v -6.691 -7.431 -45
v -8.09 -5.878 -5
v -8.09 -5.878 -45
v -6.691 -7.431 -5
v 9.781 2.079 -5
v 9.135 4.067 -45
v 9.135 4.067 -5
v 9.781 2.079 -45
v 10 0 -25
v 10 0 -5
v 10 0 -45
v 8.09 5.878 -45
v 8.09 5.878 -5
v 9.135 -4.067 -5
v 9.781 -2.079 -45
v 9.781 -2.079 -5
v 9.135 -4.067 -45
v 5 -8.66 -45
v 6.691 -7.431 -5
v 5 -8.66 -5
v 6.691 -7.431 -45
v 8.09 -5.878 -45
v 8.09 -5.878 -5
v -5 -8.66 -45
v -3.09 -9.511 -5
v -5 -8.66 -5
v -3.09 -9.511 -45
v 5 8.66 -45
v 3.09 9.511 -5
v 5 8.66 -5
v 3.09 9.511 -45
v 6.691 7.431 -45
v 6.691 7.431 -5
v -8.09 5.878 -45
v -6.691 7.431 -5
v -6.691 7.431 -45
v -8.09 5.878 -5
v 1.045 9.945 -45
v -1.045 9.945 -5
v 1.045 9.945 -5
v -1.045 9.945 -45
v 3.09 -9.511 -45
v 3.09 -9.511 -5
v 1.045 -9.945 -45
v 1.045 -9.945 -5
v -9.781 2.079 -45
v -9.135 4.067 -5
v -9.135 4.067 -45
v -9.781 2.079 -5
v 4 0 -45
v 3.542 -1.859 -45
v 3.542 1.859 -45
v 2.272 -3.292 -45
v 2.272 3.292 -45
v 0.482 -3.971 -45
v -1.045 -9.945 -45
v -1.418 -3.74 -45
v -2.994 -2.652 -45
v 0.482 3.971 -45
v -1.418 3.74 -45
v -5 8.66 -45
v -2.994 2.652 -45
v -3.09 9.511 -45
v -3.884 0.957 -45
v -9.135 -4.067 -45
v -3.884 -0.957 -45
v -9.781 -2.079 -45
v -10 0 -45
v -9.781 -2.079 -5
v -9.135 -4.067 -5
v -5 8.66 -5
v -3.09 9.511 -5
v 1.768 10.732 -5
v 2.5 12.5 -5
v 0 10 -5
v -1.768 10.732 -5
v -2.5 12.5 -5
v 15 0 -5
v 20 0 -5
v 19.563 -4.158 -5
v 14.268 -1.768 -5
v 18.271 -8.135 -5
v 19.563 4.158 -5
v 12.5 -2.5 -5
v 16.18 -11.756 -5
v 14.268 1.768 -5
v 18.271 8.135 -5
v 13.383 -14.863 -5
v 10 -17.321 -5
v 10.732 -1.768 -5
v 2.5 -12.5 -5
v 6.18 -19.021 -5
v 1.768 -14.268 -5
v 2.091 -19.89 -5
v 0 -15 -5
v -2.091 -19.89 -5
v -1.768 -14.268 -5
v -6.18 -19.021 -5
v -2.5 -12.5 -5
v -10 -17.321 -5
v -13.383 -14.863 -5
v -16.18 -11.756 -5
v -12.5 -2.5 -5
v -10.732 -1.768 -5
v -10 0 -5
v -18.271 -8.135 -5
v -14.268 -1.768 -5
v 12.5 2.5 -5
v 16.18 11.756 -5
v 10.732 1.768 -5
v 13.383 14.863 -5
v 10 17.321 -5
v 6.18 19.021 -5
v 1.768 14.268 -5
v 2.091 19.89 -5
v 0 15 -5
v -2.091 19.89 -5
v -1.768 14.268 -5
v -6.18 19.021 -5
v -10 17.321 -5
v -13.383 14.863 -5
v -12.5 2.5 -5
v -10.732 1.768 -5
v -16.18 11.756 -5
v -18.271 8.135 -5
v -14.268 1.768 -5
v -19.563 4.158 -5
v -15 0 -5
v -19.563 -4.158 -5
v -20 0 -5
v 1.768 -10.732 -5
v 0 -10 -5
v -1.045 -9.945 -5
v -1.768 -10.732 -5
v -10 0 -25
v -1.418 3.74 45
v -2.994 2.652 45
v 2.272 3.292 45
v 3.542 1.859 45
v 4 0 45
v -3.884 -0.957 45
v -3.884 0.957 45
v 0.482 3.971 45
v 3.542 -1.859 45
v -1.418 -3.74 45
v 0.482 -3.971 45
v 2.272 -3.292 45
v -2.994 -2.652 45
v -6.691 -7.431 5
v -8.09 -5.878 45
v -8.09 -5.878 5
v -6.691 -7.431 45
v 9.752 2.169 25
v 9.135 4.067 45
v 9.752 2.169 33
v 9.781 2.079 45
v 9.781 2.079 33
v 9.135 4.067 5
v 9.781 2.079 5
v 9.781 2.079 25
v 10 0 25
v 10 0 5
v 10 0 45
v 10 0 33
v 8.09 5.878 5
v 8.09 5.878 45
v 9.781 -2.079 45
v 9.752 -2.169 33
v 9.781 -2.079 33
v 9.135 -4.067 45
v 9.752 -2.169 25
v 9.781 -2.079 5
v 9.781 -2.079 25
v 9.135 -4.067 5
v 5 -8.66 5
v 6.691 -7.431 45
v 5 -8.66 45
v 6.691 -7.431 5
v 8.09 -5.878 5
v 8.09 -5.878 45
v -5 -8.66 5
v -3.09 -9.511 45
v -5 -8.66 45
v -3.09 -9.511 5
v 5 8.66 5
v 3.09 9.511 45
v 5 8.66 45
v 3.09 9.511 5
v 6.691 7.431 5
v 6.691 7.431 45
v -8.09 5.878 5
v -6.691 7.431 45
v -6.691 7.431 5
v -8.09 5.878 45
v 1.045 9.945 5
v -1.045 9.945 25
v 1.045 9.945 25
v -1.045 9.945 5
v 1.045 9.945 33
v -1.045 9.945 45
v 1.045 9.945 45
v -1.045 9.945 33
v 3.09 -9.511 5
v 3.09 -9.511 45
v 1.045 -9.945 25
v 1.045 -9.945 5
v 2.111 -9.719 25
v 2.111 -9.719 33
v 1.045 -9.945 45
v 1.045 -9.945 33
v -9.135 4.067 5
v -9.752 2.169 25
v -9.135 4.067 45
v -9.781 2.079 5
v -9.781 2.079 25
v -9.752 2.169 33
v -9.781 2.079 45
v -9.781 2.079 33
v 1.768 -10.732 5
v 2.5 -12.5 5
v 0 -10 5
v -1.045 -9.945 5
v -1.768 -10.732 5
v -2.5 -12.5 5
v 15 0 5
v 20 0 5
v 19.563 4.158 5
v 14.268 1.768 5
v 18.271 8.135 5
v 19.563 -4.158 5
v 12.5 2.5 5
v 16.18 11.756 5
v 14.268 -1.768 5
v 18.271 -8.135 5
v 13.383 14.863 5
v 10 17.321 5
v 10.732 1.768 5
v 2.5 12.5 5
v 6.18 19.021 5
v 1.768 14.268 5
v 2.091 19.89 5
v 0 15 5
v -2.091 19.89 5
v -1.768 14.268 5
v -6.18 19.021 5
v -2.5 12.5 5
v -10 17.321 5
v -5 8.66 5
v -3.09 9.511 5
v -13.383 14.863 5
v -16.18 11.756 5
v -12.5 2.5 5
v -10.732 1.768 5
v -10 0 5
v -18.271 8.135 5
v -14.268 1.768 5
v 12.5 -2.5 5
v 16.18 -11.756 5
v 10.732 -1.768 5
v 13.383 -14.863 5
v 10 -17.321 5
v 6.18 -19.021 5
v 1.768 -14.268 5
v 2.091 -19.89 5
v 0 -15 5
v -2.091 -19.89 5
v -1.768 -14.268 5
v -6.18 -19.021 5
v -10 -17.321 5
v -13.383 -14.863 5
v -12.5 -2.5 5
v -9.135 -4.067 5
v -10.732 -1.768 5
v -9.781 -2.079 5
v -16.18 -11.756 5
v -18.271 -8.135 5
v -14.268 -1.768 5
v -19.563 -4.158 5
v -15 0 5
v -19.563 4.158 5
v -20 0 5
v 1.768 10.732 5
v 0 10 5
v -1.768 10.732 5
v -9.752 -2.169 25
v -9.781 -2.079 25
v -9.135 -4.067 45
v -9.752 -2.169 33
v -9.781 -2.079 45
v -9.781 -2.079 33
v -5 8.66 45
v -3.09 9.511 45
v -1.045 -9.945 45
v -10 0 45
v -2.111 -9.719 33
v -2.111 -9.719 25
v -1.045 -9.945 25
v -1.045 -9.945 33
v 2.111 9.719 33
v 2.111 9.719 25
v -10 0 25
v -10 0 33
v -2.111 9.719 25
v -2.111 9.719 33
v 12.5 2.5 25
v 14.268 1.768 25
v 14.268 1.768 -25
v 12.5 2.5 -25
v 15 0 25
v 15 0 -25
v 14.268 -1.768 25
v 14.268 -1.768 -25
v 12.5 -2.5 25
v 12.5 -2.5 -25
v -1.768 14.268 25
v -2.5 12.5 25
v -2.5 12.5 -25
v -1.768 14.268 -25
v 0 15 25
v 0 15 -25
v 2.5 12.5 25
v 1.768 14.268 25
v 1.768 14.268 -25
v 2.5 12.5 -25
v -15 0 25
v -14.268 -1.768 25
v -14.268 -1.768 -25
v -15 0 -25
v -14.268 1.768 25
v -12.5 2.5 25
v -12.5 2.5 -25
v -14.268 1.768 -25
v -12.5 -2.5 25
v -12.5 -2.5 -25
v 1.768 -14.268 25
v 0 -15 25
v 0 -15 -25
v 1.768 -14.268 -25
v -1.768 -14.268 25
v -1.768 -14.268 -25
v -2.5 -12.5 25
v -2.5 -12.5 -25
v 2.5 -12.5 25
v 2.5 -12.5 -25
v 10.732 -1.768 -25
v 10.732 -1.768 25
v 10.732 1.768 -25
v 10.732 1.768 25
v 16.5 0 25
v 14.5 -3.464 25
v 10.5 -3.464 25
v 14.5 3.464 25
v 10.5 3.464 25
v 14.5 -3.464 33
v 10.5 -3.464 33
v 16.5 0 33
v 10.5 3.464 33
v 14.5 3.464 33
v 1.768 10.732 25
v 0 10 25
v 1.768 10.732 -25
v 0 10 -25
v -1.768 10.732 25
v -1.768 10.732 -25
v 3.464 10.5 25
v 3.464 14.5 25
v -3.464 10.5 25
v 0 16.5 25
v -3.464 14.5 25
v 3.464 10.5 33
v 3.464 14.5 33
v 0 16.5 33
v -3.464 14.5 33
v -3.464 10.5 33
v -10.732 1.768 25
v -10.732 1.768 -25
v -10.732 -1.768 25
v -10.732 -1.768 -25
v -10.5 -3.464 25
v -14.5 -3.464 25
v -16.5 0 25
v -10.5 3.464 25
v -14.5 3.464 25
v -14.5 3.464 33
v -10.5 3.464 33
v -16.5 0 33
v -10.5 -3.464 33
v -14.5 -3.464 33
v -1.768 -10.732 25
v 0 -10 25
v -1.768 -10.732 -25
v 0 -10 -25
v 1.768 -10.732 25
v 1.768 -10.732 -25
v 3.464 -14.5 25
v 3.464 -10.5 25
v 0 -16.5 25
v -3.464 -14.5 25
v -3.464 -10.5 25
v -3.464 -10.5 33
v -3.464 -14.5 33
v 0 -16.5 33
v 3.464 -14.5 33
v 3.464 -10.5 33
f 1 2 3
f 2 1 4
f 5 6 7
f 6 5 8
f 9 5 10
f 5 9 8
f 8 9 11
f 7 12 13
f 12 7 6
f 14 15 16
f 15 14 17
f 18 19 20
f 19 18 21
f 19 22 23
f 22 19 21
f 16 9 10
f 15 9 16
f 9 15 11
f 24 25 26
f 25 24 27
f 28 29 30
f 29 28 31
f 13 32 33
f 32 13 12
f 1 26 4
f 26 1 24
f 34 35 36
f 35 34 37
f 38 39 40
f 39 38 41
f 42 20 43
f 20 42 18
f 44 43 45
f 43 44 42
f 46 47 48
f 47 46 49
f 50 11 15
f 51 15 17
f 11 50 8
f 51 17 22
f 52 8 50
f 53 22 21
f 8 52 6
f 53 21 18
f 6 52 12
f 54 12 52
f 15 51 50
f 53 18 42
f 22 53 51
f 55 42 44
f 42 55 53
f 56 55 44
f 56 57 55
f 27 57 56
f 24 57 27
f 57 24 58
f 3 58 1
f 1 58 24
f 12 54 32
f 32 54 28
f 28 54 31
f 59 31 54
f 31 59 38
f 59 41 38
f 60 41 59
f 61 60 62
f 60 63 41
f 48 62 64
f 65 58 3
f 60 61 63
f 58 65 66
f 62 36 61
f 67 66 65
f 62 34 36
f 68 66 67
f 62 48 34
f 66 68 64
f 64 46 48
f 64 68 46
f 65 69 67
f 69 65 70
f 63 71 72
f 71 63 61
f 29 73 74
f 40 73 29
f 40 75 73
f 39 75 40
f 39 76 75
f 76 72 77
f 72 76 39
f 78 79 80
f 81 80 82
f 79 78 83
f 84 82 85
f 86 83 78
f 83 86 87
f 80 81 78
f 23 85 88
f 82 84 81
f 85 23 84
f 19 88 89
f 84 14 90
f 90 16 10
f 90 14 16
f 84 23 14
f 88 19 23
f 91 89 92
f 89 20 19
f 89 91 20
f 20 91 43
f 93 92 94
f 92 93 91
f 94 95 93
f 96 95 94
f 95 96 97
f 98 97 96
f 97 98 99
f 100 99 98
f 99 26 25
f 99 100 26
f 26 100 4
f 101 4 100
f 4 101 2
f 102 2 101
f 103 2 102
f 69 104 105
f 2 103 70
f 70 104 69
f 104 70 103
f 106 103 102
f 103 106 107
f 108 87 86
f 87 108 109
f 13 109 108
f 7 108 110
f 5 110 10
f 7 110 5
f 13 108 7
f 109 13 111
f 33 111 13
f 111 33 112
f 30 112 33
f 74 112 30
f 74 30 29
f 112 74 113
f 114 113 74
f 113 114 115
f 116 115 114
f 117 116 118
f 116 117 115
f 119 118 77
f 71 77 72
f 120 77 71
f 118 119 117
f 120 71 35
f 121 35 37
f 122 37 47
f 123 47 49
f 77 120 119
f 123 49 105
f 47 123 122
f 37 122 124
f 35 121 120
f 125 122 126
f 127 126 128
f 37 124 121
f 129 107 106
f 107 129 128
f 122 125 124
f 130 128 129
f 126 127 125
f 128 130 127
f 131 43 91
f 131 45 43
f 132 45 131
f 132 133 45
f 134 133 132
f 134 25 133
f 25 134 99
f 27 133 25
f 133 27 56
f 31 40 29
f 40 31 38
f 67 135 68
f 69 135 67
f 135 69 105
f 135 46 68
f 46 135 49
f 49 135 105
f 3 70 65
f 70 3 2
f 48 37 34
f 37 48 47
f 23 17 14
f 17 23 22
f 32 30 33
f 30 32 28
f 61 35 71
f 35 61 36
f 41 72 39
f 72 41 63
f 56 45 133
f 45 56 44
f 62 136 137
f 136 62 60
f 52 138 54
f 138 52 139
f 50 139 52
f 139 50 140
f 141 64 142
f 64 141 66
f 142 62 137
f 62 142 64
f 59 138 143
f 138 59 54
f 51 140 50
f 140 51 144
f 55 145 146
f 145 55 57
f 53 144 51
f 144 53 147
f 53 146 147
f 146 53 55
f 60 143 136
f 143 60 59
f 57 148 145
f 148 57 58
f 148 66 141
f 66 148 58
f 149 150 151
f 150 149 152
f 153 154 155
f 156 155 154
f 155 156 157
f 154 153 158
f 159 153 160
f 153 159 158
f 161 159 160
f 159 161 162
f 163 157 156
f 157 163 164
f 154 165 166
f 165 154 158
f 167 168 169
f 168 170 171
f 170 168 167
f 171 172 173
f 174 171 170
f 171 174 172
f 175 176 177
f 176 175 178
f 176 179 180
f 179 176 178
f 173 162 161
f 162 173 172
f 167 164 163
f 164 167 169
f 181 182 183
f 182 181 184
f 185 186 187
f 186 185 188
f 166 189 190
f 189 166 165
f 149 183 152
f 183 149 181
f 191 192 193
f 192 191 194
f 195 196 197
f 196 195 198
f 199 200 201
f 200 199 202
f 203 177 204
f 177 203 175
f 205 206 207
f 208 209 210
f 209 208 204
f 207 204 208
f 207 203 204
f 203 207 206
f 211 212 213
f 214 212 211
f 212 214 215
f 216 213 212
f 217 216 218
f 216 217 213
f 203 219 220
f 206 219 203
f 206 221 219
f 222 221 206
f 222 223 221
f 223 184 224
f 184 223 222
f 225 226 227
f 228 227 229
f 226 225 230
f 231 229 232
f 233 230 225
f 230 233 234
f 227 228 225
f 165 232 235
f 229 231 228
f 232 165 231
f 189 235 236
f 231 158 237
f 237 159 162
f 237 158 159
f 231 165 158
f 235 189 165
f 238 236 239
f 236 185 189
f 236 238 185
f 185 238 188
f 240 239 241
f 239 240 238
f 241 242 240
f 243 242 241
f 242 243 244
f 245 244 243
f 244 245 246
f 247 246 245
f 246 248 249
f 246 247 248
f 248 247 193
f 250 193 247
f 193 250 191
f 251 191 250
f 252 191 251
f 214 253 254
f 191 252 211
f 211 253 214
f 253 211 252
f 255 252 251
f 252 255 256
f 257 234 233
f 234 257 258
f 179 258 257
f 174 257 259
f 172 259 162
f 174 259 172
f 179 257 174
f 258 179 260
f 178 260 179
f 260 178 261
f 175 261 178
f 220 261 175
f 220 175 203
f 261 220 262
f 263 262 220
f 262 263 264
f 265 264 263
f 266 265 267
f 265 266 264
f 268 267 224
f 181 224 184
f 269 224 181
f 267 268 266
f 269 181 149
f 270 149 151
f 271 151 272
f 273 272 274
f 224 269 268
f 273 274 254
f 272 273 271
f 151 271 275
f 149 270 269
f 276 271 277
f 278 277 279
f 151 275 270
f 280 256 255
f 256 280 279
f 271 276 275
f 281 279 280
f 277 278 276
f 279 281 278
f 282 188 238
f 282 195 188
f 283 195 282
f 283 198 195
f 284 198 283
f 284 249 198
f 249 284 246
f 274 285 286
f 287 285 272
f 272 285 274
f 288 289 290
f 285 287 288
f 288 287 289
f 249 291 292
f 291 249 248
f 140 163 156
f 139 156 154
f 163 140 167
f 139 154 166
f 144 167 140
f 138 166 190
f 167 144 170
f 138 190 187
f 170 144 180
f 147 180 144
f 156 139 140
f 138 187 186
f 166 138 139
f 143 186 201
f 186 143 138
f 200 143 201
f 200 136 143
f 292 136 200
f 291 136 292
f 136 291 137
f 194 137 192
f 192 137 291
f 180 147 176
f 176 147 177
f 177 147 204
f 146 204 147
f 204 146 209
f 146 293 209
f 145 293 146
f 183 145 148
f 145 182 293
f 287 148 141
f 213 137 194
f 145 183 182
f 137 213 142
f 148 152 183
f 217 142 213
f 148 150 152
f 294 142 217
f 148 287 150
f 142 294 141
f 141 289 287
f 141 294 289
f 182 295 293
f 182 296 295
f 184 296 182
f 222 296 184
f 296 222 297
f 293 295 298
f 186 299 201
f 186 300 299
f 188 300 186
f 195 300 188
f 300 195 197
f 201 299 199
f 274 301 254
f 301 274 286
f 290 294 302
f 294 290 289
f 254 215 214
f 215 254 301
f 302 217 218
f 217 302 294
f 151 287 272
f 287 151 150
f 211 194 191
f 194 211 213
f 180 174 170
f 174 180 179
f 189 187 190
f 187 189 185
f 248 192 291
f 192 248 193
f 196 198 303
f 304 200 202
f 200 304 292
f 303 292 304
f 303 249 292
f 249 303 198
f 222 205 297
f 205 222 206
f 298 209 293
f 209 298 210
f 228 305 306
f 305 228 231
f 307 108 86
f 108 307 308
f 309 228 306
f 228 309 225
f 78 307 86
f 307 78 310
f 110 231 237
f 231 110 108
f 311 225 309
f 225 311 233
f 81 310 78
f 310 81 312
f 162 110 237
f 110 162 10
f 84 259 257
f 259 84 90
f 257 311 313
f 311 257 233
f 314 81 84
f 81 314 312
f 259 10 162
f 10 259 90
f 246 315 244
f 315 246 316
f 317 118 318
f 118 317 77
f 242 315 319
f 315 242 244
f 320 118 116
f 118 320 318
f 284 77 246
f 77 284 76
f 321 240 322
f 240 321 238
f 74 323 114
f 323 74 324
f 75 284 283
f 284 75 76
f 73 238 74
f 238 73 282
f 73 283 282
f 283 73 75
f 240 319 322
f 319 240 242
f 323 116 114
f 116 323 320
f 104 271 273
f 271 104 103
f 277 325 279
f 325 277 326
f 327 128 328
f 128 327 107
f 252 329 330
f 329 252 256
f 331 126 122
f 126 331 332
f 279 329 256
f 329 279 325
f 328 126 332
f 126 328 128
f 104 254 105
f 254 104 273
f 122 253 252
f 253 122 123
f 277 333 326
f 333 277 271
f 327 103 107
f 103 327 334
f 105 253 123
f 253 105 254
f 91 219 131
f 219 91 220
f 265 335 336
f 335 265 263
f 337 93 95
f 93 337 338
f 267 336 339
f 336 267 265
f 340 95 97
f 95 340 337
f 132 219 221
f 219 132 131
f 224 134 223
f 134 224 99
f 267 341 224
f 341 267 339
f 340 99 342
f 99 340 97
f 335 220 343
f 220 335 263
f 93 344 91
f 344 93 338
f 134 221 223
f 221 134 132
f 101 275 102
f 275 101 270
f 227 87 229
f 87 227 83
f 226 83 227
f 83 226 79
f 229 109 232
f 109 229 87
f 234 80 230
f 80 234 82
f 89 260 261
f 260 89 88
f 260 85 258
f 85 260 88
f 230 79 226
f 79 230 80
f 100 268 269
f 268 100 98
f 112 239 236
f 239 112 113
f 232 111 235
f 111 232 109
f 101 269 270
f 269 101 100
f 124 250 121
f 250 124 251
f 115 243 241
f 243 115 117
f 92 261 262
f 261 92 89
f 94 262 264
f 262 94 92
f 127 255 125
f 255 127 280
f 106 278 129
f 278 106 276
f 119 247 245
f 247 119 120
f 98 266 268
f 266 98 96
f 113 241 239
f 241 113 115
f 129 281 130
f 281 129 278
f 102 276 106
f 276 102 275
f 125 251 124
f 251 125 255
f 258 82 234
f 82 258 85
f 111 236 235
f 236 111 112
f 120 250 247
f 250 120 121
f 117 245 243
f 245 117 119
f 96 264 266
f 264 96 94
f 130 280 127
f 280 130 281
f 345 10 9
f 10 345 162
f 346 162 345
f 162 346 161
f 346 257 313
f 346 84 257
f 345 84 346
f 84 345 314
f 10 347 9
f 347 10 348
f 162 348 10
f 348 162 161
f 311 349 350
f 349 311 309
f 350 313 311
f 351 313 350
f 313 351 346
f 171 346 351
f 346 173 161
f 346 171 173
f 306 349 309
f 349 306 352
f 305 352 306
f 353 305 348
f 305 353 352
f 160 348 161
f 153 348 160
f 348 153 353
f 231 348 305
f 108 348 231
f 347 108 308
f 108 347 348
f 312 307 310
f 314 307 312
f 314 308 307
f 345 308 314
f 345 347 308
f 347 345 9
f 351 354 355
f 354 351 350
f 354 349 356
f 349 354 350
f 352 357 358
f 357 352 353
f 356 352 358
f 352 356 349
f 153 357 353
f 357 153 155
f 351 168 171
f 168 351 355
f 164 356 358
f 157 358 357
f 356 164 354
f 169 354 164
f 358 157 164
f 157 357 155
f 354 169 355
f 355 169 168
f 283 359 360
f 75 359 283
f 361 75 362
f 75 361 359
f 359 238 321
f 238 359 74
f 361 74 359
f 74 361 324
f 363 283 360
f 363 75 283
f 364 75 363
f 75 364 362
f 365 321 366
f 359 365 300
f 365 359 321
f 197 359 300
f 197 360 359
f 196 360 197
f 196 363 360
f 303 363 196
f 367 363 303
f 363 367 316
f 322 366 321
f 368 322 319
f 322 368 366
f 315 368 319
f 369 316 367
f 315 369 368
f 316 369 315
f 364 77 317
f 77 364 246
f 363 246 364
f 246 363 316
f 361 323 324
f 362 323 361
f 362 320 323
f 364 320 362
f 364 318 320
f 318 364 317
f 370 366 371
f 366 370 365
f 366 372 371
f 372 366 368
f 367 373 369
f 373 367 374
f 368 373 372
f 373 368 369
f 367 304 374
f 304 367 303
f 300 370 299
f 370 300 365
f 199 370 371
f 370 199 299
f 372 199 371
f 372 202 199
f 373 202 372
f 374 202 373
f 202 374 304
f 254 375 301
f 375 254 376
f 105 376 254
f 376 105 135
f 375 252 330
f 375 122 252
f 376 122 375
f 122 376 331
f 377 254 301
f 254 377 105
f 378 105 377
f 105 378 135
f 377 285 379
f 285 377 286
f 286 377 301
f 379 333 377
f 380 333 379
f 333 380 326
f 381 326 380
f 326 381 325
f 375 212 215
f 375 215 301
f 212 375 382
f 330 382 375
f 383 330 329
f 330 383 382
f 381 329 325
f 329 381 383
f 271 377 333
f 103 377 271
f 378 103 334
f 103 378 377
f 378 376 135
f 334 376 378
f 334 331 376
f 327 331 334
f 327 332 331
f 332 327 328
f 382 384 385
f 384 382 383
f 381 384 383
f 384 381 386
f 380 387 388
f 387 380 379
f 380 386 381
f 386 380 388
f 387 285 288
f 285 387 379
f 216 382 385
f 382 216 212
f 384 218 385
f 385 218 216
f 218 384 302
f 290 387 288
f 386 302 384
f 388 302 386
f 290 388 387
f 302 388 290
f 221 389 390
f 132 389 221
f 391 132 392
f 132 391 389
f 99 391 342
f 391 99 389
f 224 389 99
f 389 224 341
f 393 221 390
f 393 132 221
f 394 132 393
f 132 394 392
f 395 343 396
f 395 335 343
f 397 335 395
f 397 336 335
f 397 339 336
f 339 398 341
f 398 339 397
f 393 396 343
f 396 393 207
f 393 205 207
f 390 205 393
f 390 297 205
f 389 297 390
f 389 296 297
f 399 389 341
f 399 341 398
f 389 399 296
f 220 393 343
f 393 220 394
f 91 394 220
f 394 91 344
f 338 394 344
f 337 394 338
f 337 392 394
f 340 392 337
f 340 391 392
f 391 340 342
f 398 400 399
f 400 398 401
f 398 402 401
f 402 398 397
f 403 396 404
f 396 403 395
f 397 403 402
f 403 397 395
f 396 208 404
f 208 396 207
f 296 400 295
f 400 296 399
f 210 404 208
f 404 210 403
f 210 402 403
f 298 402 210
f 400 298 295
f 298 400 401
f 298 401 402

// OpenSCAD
//start

// Parameters
shaft_length = 40;
shaft_diameter = 20;
shaft_hole_diameter = 8;
flange_diameter = 40;
flange_thickness = 5;
diaphragm_thickness = 2;
bolt_diameter = 5;
bolt_length = 50;
nut_size = 8;
bolt_spacing = 25;

// Function to create a shaft
module shaft() {
    difference() {
        cylinder(h=shaft_length, d=shaft_diameter, center=true);
        cylinder(h=shaft_length+2, d=shaft_hole_diameter, center=true);
    }
}

// Function to create a flange plate
module flange_plate() {
    difference() {
        cylinder(h=flange_thickness, d=flange_diameter, center=true);
        cylinder(h=flange_thickness+2, d=shaft_hole_diameter, center=true);
        for (i = [0:3]) {
            rotate([0, 0, i * 90])
                translate([bolt_spacing/2, 0, 0])
                cylinder(h=flange_thickness+2, d=bolt_diameter, center=true);
        }
    }
}

// Function to create the diaphragm
module diaphragm() {
    difference() {
        cylinder(h=diaphragm_thickness, d=flange_diameter, center=true);
        cylinder(h=diaphragm_thickness+2, d=shaft_hole_diameter, center=true);
        for (i = [0:3]) {
            rotate([0, 0, i * 90])
                translate([bolt_spacing/2, 0, 0])
                cylinder(h=diaphragm_thickness+2, d=bolt_diameter, center=true);
        }
    }
}

// Function to create a bolt
module bolt() {
    translate([0, 0, -bolt_length/2])
    cylinder(h=bolt_length, d=bolt_diameter, center=false);
}

// Function to create a nut
module nut() {
    cylinder(h=nut_size, d=nut_size, $fn=6);
}

// Assembly of the coupling
module coupling() {
    // Left Shaft
    translate([0, 0, -shaft_length/2 - flange_thickness])
    shaft();
    
    // Right Shaft
    translate([0, 0, shaft_length/2 + flange_thickness])
    shaft();
    
    // Left Flange Plate
    translate([0, 0, -flange_thickness/2])
    flange_plate();
    
    // Right Flange Plate
    translate([0, 0, flange_thickness/2])
    flange_plate();
    
    // Diaphragm
    diaphragm();
    
    // Bolts and Nuts
    for (i = [0:3]) {
        rotate([0, 0, i * 90])
            translate([bolt_spacing/2, 0, 0]) {
                bolt();
                translate([0, 0, bolt_length/2])
                nut();
            }
    }
}

// Render the coupling
coupling();
